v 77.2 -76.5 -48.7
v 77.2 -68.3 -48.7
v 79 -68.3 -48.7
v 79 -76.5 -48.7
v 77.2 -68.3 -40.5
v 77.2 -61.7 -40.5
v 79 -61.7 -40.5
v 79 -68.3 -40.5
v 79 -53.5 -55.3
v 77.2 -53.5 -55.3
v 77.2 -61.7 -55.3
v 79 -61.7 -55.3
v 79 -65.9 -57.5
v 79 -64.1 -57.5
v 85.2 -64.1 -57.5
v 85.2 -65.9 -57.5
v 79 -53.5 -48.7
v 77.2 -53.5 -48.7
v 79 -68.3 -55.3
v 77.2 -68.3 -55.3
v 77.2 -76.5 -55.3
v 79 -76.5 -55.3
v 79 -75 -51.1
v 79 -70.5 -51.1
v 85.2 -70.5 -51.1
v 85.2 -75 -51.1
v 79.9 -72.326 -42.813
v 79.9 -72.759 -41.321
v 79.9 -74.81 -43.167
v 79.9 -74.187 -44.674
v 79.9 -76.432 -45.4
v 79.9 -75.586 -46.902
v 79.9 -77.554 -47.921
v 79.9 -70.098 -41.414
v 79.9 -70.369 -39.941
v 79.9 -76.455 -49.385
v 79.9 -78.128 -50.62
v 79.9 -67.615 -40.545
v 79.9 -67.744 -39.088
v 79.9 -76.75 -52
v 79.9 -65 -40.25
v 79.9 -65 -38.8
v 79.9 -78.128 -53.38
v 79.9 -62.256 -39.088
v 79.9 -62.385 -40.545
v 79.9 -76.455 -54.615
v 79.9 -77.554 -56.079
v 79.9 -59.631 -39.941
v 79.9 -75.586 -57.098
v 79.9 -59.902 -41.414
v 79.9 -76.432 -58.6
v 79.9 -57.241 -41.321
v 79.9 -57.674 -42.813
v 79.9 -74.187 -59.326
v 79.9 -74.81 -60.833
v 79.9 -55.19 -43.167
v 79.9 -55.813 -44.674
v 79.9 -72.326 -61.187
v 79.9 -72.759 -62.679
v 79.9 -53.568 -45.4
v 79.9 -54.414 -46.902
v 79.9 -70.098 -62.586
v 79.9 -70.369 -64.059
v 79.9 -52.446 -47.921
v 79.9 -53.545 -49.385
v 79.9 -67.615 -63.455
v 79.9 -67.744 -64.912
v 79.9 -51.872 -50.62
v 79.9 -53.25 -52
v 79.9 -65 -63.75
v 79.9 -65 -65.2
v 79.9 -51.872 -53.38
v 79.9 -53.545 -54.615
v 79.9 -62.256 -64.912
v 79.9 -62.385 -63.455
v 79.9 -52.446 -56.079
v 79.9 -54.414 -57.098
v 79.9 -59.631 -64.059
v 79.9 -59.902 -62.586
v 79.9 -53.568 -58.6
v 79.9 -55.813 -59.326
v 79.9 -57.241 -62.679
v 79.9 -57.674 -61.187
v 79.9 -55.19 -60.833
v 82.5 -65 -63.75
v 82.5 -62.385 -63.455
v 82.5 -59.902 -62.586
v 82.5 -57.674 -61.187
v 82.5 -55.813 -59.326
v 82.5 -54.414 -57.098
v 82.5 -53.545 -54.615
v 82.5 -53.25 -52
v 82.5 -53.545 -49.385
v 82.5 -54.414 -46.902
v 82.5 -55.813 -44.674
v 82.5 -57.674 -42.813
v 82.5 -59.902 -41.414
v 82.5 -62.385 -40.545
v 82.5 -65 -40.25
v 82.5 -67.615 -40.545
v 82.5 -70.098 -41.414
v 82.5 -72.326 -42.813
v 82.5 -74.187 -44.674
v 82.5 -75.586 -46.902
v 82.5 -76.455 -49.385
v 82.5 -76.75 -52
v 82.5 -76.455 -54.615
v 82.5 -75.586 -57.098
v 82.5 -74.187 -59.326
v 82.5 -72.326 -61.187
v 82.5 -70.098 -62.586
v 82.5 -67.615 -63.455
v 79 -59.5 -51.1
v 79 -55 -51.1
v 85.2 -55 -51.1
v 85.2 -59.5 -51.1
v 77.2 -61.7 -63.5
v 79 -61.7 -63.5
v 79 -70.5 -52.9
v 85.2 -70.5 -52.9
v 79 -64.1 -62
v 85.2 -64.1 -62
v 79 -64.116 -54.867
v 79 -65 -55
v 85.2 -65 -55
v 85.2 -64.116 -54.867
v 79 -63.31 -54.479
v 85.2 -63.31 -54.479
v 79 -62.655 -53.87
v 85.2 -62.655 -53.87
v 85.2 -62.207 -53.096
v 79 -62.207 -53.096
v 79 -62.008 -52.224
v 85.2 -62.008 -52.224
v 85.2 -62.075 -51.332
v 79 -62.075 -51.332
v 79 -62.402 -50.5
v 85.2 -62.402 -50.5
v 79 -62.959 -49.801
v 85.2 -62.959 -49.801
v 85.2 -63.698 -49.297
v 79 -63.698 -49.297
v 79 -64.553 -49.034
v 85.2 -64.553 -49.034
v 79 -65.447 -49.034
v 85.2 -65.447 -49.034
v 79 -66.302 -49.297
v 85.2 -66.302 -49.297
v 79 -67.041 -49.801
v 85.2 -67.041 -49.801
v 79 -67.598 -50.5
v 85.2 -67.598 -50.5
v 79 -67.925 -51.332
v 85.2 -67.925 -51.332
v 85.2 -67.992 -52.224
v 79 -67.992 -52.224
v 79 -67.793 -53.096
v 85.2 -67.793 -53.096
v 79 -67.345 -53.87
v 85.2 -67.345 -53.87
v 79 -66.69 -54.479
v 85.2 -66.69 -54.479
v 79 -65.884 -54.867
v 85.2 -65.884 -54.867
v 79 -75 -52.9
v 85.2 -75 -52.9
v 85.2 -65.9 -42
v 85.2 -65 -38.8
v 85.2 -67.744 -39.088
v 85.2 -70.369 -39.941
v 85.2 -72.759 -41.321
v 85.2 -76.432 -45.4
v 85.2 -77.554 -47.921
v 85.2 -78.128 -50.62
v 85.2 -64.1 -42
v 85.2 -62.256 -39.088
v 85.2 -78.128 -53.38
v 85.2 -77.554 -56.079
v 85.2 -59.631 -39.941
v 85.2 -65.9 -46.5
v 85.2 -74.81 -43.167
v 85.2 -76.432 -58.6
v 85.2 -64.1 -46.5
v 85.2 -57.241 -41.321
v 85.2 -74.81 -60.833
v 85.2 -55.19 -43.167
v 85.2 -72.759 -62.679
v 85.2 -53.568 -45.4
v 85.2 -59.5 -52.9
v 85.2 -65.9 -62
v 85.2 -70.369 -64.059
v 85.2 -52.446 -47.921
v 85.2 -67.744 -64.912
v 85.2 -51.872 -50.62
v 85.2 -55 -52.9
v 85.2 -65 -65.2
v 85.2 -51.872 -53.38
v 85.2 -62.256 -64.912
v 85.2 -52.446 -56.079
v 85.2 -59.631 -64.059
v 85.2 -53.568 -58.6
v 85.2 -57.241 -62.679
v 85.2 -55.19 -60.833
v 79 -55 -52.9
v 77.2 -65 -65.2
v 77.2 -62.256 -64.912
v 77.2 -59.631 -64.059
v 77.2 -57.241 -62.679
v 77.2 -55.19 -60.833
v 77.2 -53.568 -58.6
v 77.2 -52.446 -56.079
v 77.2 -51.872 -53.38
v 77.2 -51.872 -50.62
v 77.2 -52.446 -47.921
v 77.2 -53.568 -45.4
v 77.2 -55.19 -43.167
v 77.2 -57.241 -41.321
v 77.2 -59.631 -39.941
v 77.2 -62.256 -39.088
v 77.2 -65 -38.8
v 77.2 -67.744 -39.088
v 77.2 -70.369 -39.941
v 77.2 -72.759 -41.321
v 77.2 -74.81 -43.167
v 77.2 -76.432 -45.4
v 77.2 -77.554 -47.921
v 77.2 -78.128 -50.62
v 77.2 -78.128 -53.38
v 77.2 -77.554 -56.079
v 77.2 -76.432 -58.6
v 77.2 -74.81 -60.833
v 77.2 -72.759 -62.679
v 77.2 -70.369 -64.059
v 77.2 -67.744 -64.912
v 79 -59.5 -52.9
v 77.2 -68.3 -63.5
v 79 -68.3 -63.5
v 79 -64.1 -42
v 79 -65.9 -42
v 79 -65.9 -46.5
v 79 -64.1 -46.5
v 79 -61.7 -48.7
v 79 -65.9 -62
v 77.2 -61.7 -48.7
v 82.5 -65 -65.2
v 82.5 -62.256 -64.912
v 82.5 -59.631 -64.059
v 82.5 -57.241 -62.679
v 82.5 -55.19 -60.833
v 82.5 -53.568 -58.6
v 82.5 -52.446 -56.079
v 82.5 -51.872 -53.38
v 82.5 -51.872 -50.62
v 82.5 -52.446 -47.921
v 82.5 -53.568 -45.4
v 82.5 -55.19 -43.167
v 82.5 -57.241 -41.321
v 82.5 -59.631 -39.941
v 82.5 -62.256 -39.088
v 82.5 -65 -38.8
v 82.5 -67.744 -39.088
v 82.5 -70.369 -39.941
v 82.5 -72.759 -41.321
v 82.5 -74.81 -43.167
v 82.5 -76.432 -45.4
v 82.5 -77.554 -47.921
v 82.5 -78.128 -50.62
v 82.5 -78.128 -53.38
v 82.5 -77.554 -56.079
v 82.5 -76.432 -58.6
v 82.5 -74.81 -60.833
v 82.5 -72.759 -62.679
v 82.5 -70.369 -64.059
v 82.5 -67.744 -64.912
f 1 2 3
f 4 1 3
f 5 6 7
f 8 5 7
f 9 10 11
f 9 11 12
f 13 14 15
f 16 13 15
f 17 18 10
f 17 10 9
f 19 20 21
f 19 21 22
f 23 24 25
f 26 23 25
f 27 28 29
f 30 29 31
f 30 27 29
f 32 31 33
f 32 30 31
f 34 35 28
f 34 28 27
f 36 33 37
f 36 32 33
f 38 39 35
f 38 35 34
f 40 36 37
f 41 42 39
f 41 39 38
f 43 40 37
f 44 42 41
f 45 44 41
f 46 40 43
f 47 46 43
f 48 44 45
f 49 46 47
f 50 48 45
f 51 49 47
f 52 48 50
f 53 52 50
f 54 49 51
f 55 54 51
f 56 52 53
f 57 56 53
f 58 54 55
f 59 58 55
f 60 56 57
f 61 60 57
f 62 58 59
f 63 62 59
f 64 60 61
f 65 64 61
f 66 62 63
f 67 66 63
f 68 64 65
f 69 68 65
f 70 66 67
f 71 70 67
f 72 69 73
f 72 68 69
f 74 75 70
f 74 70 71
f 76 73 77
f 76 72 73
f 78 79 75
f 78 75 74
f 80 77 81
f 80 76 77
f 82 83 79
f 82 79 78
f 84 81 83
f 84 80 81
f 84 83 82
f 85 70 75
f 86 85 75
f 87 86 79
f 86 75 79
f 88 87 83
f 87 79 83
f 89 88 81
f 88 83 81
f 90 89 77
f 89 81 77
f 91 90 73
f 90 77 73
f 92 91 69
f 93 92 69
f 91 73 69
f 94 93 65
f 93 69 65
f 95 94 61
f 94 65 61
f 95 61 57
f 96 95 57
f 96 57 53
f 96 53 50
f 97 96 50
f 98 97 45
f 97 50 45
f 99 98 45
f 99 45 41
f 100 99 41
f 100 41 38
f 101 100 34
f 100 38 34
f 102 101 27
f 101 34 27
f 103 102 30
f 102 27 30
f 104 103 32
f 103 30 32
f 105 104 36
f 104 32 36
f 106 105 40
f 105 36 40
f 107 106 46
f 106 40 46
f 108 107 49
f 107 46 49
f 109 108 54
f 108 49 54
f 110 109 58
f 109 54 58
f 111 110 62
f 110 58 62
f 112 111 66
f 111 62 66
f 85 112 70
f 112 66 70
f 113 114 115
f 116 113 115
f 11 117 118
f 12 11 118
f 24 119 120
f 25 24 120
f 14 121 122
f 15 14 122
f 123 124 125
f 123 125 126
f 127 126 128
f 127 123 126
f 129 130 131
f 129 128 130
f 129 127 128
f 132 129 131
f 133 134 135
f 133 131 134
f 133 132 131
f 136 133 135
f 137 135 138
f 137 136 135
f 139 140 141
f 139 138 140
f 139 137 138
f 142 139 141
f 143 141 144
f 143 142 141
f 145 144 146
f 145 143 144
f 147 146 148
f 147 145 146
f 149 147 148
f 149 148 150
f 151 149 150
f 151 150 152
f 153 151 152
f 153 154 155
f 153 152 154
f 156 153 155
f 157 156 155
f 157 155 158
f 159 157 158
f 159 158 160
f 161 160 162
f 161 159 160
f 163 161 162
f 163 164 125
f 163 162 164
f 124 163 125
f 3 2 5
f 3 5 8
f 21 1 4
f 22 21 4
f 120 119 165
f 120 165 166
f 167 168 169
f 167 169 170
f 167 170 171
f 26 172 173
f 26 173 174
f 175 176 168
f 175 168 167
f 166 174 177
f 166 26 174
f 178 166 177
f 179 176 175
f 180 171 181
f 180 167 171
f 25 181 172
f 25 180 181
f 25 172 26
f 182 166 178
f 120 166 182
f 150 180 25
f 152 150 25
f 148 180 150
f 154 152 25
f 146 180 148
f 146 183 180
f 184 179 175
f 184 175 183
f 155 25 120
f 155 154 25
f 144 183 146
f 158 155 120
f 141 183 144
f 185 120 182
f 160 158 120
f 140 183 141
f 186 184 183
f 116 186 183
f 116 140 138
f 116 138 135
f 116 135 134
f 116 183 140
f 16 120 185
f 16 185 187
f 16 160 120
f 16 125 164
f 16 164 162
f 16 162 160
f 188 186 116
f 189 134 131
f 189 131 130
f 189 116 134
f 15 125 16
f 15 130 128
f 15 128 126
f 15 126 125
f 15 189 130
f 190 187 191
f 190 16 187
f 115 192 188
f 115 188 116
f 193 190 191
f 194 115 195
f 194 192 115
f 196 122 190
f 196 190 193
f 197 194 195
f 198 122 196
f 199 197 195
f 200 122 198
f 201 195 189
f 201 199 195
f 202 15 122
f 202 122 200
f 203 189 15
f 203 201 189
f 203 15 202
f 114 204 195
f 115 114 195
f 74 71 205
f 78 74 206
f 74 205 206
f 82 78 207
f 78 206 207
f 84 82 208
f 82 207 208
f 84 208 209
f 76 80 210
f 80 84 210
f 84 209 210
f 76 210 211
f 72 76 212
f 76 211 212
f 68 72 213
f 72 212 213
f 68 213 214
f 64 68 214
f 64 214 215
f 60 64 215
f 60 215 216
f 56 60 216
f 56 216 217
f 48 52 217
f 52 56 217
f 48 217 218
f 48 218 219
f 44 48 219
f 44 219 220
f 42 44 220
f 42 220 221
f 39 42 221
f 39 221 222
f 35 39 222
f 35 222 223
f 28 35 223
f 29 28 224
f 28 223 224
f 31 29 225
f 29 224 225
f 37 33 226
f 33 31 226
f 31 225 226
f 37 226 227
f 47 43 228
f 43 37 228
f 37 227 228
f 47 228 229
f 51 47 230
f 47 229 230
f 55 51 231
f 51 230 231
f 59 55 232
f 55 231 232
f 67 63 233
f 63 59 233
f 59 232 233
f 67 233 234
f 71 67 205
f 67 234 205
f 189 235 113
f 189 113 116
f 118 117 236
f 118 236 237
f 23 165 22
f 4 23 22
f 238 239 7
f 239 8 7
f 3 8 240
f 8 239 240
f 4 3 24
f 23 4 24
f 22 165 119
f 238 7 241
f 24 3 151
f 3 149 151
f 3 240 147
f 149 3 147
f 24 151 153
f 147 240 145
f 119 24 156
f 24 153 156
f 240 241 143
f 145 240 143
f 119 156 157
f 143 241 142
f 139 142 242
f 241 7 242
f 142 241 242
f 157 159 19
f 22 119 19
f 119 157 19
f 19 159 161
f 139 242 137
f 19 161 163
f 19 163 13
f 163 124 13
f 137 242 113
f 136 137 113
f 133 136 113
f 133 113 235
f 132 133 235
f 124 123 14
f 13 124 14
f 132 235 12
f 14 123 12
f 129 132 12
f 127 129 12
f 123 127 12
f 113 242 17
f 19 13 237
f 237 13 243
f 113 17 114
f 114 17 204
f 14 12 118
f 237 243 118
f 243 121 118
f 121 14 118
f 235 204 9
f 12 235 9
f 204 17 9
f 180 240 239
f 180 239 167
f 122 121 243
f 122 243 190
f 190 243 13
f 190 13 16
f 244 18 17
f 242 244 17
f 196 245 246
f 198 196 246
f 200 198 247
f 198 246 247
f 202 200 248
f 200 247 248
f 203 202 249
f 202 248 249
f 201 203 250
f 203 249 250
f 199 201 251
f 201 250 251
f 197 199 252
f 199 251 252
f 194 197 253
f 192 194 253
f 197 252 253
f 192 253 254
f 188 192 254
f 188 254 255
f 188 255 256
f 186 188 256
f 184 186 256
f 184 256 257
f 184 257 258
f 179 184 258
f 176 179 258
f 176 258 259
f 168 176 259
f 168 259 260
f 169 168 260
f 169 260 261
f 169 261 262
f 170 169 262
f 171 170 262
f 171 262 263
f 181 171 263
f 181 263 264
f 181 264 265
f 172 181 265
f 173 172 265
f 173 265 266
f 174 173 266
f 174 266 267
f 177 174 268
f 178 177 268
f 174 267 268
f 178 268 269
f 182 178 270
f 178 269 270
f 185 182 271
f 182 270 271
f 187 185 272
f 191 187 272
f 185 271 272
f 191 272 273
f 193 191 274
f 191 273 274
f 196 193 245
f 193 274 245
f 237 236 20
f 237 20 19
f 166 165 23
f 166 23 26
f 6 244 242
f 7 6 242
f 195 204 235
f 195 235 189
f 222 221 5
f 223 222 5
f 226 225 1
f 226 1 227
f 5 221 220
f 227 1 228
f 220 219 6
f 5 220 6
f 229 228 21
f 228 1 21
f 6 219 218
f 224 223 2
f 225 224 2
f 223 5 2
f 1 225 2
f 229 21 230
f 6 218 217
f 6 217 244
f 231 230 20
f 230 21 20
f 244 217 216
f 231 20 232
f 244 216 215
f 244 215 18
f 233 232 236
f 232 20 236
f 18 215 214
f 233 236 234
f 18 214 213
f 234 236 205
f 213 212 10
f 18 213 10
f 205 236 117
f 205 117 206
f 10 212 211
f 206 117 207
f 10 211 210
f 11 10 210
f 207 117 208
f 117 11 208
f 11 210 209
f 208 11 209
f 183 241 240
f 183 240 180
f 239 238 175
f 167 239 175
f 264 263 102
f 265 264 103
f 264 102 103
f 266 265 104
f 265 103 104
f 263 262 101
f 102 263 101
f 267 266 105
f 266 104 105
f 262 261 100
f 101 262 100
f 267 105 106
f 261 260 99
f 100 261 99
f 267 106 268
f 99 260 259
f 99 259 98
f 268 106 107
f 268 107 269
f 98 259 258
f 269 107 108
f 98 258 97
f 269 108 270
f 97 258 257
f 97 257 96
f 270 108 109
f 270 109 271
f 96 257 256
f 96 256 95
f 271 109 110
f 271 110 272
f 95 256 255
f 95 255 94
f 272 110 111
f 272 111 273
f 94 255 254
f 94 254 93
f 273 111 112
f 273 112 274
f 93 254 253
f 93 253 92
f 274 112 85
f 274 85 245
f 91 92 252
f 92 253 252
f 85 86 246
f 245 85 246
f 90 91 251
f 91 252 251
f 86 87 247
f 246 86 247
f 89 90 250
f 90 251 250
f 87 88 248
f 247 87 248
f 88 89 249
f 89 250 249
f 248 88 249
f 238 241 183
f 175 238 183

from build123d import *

# Parameters (mm, degrees)
BOSS_EXTRUDE1_START  = 77.2
SKETCH1_R            = 13.2
BOSS_EXTRUDE1_DEPTH  = 8
BOSS_EXTRUDE2_START  = 79.9
SKETCH2_R            = 20
BOSS_EXTRUDE2_DEPTH  = 2.6
BOSS_EXTRUDE3_START  = 79.9
SKETCH3_R            = 11.75
BOSS_EXTRUDE3_DEPTH  = 2.6
BOSS_EXTRUDE4_START  = 76.7
SKETCH4_R            = 4.6
BOSS_EXTRUDE4_DEPTH  = 2.3
BOSS_EXTRUDE5_START  = -55.3
SKETCH5_W            = 2.3
SKETCH5_H            = 11.5
BOSS_EXTRUDE5_DEPTH  = 6.6
BOSS_EXTRUDE6_START  = -52.9
SKETCH6_W            = 10
SKETCH6_H            = 4.5
BOSS_EXTRUDE6_DEPTH  = 1.8
BOSS_EXTRUDE7_START  = -55.3
SKETCH7_W            = 2.3
SKETCH7_H            = 11.5
BOSS_EXTRUDE7_DEPTH  = 6.6
BOSS_EXTRUDE8_START  = -52.9
SKETCH8_W            = 10
SKETCH8_H            = 4.5
BOSS_EXTRUDE8_DEPTH  = 1.8
BOSS_EXTRUDE9_START  = -52
SKETCH9_W            = 2.3
SKETCH9_H            = 6.6
BOSS_EXTRUDE9_DEPTH  = 11.5
BOSS_EXTRUDE10_START = -46.5
SKETCH10_W           = 10
SKETCH10_H           = 1.8
BOSS_EXTRUDE10_DEPTH = 4.5
BOSS_EXTRUDE11_START = -63.5
SKETCH11_W           = 2.3
SKETCH11_H           = 6.6
BOSS_EXTRUDE11_DEPTH = 11.5
BOSS_EXTRUDE12_START = -62
SKETCH12_W           = 10
SKETCH12_H           = 1.8
BOSS_EXTRUDE12_DEPTH = 4.5
BOSS_EXTRUDE13_START = 76.2
SKETCH13_R           = 3
BOSS_EXTRUDE13_DEPTH = 10


with BuildPart() as part:
    # Sketch1 → Boss-Extrude1 (new body)
    with BuildSketch(Plane(origin=(0, 0, 0), x_dir=(0, 0, -1), z_dir=(1, 0, 0)).offset(BOSS_EXTRUDE1_START)):
        with Locations((52, -65)):
            Circle(SKETCH1_R)
    extrude(amount=BOSS_EXTRUDE1_DEPTH)


with BuildPart() as body_2:
    # Sketch2 → Boss-Extrude2 (new body)
    with BuildSketch(Plane(origin=(0, 0, 0), x_dir=(0, 0, -1), z_dir=(1, 0, 0)).offset(BOSS_EXTRUDE2_START)):
        with Locations((52, -65)):
            Circle(SKETCH2_R)
    extrude(amount=BOSS_EXTRUDE2_DEPTH)


with BuildPart() as part_1:
    add(part.part)

    # Combine1: cut body 2
    add(body_2.part, mode=Mode.SUBTRACT)

    # Sketch3 → Boss-Extrude3 (add)
    with BuildSketch(Plane(origin=(0, 0, 0), x_dir=(0, 0, -1), z_dir=(1, 0, 0)).offset(BOSS_EXTRUDE3_START)):
        with Locations((52, -65)):
            Circle(SKETCH3_R)
    extrude(amount=BOSS_EXTRUDE3_DEPTH)


with BuildPart() as body_2_2:
    # Sketch4 → Boss-Extrude4 (new body)
    with BuildSketch(Plane(origin=(0, 0, 0), x_dir=(0, 0, -1), z_dir=(1, 0, 0)).offset(BOSS_EXTRUDE4_START)):
        with Locations((52, -65)):
            Circle(SKETCH4_R)
    extrude(amount=BOSS_EXTRUDE4_DEPTH)


with BuildPart() as part_2:
    add(part_1.part)

    # Combine2: cut body 2 2
    add(body_2_2.part, mode=Mode.SUBTRACT)


with BuildPart() as body_2_3:
    # Sketch5 → Boss-Extrude5 (new body)
    with BuildSketch(Plane.XY.offset(BOSS_EXTRUDE5_START)):
        with Locations((77.85, -59.25)):
            Rectangle(SKETCH5_W, SKETCH5_H)
    extrude(amount=BOSS_EXTRUDE5_DEPTH)


with BuildPart() as part_3:
    add(part_2.part)

    # Combine3: cut body 2 3
    add(body_2_3.part, mode=Mode.SUBTRACT)


with BuildPart() as body_2_4:
    # Sketch6 → Boss-Extrude6 (new body)
    with BuildSketch(Plane.XY.offset(BOSS_EXTRUDE6_START)):
        with Locations((81.2, -57.25)):
            Rectangle(SKETCH6_W, SKETCH6_H)
    extrude(amount=BOSS_EXTRUDE6_DEPTH)


with BuildPart() as part_4:
    add(part_3.part)

    # Combine4: cut body 2 4
    add(body_2_4.part, mode=Mode.SUBTRACT)


with BuildPart() as body_2_5:
    # Sketch7 → Boss-Extrude7 (new body)
    with BuildSketch(Plane.XY.offset(BOSS_EXTRUDE7_START)):
        with Locations((77.85, -70.75)):
            Rectangle(SKETCH7_W, SKETCH7_H)
    extrude(amount=BOSS_EXTRUDE7_DEPTH)


with BuildPart() as part_5:
    add(part_4.part)

    # Combine5: cut body 2 5
    add(body_2_5.part, mode=Mode.SUBTRACT)


with BuildPart() as body_2_6:
    # Sketch8 → Boss-Extrude8 (new body)
    with BuildSketch(Plane.XY.offset(BOSS_EXTRUDE8_START)):
        with Locations((81.2, -72.75)):
            Rectangle(SKETCH8_W, SKETCH8_H)
    extrude(amount=BOSS_EXTRUDE8_DEPTH)


with BuildPart() as part_6:
    add(part_5.part)

    # Combine6: cut body 2 6
    add(body_2_6.part, mode=Mode.SUBTRACT)


with BuildPart() as body_2_7:
    # Sketch9 → Boss-Extrude9 (new body)
    with BuildSketch(Plane.XY.offset(BOSS_EXTRUDE9_START)):
        with Locations((77.85, -65)):
            Rectangle(SKETCH9_W, SKETCH9_H)
    extrude(amount=BOSS_EXTRUDE9_DEPTH)


with BuildPart() as part_7:
    add(part_6.part)

    # Combine7: cut body 2 7
    add(body_2_7.part, mode=Mode.SUBTRACT)


with BuildPart() as body_2_8:
    # Sketch10 → Boss-Extrude10 (new body)
    with BuildSketch(Plane.XY.offset(BOSS_EXTRUDE10_START)):
        with Locations((81.2, -65)):
            Rectangle(SKETCH10_W, SKETCH10_H)
    extrude(amount=BOSS_EXTRUDE10_DEPTH)


with BuildPart() as part_8:
    add(part_7.part)

    # Combine8: cut body 2 8
    add(body_2_8.part, mode=Mode.SUBTRACT)


with BuildPart() as body_2_9:
    # Sketch11 → Boss-Extrude11 (new body)
    with BuildSketch(Plane.XY.offset(BOSS_EXTRUDE11_START)):
        with Locations((77.85, -65)):
            Rectangle(SKETCH11_W, SKETCH11_H)
    extrude(amount=BOSS_EXTRUDE11_DEPTH)


with BuildPart() as part_9:
    add(part_8.part)

    # Combine9: cut body 2 9
    add(body_2_9.part, mode=Mode.SUBTRACT)


with BuildPart() as body_2_10:
    # Sketch12 → Boss-Extrude12 (new body)
    with BuildSketch(Plane.XY.offset(BOSS_EXTRUDE12_START)):
        with Locations((81.2, -65)):
            Rectangle(SKETCH12_W, SKETCH12_H)
    extrude(amount=BOSS_EXTRUDE12_DEPTH)


with BuildPart() as part_10:
    add(part_9.part)

    # Combine10: cut body 2 10
    add(body_2_10.part, mode=Mode.SUBTRACT)


with BuildPart() as body_2_11:
    # Sketch13 → Boss-Extrude13 (new body)
    with BuildSketch(Plane(origin=(0, 0, 0), x_dir=(0, 0, -1), z_dir=(1, 0, 0)).offset(BOSS_EXTRUDE13_START)):
        with Locations((52, -65)):
            Circle(SKETCH13_R)
    extrude(amount=BOSS_EXTRUDE13_DEPTH)


with BuildPart() as part_11:
    add(part_10.part)

    # Combine11: cut body 2 11
    add(body_2_11.part, mode=Mode.SUBTRACT)


solid = part_11.part
